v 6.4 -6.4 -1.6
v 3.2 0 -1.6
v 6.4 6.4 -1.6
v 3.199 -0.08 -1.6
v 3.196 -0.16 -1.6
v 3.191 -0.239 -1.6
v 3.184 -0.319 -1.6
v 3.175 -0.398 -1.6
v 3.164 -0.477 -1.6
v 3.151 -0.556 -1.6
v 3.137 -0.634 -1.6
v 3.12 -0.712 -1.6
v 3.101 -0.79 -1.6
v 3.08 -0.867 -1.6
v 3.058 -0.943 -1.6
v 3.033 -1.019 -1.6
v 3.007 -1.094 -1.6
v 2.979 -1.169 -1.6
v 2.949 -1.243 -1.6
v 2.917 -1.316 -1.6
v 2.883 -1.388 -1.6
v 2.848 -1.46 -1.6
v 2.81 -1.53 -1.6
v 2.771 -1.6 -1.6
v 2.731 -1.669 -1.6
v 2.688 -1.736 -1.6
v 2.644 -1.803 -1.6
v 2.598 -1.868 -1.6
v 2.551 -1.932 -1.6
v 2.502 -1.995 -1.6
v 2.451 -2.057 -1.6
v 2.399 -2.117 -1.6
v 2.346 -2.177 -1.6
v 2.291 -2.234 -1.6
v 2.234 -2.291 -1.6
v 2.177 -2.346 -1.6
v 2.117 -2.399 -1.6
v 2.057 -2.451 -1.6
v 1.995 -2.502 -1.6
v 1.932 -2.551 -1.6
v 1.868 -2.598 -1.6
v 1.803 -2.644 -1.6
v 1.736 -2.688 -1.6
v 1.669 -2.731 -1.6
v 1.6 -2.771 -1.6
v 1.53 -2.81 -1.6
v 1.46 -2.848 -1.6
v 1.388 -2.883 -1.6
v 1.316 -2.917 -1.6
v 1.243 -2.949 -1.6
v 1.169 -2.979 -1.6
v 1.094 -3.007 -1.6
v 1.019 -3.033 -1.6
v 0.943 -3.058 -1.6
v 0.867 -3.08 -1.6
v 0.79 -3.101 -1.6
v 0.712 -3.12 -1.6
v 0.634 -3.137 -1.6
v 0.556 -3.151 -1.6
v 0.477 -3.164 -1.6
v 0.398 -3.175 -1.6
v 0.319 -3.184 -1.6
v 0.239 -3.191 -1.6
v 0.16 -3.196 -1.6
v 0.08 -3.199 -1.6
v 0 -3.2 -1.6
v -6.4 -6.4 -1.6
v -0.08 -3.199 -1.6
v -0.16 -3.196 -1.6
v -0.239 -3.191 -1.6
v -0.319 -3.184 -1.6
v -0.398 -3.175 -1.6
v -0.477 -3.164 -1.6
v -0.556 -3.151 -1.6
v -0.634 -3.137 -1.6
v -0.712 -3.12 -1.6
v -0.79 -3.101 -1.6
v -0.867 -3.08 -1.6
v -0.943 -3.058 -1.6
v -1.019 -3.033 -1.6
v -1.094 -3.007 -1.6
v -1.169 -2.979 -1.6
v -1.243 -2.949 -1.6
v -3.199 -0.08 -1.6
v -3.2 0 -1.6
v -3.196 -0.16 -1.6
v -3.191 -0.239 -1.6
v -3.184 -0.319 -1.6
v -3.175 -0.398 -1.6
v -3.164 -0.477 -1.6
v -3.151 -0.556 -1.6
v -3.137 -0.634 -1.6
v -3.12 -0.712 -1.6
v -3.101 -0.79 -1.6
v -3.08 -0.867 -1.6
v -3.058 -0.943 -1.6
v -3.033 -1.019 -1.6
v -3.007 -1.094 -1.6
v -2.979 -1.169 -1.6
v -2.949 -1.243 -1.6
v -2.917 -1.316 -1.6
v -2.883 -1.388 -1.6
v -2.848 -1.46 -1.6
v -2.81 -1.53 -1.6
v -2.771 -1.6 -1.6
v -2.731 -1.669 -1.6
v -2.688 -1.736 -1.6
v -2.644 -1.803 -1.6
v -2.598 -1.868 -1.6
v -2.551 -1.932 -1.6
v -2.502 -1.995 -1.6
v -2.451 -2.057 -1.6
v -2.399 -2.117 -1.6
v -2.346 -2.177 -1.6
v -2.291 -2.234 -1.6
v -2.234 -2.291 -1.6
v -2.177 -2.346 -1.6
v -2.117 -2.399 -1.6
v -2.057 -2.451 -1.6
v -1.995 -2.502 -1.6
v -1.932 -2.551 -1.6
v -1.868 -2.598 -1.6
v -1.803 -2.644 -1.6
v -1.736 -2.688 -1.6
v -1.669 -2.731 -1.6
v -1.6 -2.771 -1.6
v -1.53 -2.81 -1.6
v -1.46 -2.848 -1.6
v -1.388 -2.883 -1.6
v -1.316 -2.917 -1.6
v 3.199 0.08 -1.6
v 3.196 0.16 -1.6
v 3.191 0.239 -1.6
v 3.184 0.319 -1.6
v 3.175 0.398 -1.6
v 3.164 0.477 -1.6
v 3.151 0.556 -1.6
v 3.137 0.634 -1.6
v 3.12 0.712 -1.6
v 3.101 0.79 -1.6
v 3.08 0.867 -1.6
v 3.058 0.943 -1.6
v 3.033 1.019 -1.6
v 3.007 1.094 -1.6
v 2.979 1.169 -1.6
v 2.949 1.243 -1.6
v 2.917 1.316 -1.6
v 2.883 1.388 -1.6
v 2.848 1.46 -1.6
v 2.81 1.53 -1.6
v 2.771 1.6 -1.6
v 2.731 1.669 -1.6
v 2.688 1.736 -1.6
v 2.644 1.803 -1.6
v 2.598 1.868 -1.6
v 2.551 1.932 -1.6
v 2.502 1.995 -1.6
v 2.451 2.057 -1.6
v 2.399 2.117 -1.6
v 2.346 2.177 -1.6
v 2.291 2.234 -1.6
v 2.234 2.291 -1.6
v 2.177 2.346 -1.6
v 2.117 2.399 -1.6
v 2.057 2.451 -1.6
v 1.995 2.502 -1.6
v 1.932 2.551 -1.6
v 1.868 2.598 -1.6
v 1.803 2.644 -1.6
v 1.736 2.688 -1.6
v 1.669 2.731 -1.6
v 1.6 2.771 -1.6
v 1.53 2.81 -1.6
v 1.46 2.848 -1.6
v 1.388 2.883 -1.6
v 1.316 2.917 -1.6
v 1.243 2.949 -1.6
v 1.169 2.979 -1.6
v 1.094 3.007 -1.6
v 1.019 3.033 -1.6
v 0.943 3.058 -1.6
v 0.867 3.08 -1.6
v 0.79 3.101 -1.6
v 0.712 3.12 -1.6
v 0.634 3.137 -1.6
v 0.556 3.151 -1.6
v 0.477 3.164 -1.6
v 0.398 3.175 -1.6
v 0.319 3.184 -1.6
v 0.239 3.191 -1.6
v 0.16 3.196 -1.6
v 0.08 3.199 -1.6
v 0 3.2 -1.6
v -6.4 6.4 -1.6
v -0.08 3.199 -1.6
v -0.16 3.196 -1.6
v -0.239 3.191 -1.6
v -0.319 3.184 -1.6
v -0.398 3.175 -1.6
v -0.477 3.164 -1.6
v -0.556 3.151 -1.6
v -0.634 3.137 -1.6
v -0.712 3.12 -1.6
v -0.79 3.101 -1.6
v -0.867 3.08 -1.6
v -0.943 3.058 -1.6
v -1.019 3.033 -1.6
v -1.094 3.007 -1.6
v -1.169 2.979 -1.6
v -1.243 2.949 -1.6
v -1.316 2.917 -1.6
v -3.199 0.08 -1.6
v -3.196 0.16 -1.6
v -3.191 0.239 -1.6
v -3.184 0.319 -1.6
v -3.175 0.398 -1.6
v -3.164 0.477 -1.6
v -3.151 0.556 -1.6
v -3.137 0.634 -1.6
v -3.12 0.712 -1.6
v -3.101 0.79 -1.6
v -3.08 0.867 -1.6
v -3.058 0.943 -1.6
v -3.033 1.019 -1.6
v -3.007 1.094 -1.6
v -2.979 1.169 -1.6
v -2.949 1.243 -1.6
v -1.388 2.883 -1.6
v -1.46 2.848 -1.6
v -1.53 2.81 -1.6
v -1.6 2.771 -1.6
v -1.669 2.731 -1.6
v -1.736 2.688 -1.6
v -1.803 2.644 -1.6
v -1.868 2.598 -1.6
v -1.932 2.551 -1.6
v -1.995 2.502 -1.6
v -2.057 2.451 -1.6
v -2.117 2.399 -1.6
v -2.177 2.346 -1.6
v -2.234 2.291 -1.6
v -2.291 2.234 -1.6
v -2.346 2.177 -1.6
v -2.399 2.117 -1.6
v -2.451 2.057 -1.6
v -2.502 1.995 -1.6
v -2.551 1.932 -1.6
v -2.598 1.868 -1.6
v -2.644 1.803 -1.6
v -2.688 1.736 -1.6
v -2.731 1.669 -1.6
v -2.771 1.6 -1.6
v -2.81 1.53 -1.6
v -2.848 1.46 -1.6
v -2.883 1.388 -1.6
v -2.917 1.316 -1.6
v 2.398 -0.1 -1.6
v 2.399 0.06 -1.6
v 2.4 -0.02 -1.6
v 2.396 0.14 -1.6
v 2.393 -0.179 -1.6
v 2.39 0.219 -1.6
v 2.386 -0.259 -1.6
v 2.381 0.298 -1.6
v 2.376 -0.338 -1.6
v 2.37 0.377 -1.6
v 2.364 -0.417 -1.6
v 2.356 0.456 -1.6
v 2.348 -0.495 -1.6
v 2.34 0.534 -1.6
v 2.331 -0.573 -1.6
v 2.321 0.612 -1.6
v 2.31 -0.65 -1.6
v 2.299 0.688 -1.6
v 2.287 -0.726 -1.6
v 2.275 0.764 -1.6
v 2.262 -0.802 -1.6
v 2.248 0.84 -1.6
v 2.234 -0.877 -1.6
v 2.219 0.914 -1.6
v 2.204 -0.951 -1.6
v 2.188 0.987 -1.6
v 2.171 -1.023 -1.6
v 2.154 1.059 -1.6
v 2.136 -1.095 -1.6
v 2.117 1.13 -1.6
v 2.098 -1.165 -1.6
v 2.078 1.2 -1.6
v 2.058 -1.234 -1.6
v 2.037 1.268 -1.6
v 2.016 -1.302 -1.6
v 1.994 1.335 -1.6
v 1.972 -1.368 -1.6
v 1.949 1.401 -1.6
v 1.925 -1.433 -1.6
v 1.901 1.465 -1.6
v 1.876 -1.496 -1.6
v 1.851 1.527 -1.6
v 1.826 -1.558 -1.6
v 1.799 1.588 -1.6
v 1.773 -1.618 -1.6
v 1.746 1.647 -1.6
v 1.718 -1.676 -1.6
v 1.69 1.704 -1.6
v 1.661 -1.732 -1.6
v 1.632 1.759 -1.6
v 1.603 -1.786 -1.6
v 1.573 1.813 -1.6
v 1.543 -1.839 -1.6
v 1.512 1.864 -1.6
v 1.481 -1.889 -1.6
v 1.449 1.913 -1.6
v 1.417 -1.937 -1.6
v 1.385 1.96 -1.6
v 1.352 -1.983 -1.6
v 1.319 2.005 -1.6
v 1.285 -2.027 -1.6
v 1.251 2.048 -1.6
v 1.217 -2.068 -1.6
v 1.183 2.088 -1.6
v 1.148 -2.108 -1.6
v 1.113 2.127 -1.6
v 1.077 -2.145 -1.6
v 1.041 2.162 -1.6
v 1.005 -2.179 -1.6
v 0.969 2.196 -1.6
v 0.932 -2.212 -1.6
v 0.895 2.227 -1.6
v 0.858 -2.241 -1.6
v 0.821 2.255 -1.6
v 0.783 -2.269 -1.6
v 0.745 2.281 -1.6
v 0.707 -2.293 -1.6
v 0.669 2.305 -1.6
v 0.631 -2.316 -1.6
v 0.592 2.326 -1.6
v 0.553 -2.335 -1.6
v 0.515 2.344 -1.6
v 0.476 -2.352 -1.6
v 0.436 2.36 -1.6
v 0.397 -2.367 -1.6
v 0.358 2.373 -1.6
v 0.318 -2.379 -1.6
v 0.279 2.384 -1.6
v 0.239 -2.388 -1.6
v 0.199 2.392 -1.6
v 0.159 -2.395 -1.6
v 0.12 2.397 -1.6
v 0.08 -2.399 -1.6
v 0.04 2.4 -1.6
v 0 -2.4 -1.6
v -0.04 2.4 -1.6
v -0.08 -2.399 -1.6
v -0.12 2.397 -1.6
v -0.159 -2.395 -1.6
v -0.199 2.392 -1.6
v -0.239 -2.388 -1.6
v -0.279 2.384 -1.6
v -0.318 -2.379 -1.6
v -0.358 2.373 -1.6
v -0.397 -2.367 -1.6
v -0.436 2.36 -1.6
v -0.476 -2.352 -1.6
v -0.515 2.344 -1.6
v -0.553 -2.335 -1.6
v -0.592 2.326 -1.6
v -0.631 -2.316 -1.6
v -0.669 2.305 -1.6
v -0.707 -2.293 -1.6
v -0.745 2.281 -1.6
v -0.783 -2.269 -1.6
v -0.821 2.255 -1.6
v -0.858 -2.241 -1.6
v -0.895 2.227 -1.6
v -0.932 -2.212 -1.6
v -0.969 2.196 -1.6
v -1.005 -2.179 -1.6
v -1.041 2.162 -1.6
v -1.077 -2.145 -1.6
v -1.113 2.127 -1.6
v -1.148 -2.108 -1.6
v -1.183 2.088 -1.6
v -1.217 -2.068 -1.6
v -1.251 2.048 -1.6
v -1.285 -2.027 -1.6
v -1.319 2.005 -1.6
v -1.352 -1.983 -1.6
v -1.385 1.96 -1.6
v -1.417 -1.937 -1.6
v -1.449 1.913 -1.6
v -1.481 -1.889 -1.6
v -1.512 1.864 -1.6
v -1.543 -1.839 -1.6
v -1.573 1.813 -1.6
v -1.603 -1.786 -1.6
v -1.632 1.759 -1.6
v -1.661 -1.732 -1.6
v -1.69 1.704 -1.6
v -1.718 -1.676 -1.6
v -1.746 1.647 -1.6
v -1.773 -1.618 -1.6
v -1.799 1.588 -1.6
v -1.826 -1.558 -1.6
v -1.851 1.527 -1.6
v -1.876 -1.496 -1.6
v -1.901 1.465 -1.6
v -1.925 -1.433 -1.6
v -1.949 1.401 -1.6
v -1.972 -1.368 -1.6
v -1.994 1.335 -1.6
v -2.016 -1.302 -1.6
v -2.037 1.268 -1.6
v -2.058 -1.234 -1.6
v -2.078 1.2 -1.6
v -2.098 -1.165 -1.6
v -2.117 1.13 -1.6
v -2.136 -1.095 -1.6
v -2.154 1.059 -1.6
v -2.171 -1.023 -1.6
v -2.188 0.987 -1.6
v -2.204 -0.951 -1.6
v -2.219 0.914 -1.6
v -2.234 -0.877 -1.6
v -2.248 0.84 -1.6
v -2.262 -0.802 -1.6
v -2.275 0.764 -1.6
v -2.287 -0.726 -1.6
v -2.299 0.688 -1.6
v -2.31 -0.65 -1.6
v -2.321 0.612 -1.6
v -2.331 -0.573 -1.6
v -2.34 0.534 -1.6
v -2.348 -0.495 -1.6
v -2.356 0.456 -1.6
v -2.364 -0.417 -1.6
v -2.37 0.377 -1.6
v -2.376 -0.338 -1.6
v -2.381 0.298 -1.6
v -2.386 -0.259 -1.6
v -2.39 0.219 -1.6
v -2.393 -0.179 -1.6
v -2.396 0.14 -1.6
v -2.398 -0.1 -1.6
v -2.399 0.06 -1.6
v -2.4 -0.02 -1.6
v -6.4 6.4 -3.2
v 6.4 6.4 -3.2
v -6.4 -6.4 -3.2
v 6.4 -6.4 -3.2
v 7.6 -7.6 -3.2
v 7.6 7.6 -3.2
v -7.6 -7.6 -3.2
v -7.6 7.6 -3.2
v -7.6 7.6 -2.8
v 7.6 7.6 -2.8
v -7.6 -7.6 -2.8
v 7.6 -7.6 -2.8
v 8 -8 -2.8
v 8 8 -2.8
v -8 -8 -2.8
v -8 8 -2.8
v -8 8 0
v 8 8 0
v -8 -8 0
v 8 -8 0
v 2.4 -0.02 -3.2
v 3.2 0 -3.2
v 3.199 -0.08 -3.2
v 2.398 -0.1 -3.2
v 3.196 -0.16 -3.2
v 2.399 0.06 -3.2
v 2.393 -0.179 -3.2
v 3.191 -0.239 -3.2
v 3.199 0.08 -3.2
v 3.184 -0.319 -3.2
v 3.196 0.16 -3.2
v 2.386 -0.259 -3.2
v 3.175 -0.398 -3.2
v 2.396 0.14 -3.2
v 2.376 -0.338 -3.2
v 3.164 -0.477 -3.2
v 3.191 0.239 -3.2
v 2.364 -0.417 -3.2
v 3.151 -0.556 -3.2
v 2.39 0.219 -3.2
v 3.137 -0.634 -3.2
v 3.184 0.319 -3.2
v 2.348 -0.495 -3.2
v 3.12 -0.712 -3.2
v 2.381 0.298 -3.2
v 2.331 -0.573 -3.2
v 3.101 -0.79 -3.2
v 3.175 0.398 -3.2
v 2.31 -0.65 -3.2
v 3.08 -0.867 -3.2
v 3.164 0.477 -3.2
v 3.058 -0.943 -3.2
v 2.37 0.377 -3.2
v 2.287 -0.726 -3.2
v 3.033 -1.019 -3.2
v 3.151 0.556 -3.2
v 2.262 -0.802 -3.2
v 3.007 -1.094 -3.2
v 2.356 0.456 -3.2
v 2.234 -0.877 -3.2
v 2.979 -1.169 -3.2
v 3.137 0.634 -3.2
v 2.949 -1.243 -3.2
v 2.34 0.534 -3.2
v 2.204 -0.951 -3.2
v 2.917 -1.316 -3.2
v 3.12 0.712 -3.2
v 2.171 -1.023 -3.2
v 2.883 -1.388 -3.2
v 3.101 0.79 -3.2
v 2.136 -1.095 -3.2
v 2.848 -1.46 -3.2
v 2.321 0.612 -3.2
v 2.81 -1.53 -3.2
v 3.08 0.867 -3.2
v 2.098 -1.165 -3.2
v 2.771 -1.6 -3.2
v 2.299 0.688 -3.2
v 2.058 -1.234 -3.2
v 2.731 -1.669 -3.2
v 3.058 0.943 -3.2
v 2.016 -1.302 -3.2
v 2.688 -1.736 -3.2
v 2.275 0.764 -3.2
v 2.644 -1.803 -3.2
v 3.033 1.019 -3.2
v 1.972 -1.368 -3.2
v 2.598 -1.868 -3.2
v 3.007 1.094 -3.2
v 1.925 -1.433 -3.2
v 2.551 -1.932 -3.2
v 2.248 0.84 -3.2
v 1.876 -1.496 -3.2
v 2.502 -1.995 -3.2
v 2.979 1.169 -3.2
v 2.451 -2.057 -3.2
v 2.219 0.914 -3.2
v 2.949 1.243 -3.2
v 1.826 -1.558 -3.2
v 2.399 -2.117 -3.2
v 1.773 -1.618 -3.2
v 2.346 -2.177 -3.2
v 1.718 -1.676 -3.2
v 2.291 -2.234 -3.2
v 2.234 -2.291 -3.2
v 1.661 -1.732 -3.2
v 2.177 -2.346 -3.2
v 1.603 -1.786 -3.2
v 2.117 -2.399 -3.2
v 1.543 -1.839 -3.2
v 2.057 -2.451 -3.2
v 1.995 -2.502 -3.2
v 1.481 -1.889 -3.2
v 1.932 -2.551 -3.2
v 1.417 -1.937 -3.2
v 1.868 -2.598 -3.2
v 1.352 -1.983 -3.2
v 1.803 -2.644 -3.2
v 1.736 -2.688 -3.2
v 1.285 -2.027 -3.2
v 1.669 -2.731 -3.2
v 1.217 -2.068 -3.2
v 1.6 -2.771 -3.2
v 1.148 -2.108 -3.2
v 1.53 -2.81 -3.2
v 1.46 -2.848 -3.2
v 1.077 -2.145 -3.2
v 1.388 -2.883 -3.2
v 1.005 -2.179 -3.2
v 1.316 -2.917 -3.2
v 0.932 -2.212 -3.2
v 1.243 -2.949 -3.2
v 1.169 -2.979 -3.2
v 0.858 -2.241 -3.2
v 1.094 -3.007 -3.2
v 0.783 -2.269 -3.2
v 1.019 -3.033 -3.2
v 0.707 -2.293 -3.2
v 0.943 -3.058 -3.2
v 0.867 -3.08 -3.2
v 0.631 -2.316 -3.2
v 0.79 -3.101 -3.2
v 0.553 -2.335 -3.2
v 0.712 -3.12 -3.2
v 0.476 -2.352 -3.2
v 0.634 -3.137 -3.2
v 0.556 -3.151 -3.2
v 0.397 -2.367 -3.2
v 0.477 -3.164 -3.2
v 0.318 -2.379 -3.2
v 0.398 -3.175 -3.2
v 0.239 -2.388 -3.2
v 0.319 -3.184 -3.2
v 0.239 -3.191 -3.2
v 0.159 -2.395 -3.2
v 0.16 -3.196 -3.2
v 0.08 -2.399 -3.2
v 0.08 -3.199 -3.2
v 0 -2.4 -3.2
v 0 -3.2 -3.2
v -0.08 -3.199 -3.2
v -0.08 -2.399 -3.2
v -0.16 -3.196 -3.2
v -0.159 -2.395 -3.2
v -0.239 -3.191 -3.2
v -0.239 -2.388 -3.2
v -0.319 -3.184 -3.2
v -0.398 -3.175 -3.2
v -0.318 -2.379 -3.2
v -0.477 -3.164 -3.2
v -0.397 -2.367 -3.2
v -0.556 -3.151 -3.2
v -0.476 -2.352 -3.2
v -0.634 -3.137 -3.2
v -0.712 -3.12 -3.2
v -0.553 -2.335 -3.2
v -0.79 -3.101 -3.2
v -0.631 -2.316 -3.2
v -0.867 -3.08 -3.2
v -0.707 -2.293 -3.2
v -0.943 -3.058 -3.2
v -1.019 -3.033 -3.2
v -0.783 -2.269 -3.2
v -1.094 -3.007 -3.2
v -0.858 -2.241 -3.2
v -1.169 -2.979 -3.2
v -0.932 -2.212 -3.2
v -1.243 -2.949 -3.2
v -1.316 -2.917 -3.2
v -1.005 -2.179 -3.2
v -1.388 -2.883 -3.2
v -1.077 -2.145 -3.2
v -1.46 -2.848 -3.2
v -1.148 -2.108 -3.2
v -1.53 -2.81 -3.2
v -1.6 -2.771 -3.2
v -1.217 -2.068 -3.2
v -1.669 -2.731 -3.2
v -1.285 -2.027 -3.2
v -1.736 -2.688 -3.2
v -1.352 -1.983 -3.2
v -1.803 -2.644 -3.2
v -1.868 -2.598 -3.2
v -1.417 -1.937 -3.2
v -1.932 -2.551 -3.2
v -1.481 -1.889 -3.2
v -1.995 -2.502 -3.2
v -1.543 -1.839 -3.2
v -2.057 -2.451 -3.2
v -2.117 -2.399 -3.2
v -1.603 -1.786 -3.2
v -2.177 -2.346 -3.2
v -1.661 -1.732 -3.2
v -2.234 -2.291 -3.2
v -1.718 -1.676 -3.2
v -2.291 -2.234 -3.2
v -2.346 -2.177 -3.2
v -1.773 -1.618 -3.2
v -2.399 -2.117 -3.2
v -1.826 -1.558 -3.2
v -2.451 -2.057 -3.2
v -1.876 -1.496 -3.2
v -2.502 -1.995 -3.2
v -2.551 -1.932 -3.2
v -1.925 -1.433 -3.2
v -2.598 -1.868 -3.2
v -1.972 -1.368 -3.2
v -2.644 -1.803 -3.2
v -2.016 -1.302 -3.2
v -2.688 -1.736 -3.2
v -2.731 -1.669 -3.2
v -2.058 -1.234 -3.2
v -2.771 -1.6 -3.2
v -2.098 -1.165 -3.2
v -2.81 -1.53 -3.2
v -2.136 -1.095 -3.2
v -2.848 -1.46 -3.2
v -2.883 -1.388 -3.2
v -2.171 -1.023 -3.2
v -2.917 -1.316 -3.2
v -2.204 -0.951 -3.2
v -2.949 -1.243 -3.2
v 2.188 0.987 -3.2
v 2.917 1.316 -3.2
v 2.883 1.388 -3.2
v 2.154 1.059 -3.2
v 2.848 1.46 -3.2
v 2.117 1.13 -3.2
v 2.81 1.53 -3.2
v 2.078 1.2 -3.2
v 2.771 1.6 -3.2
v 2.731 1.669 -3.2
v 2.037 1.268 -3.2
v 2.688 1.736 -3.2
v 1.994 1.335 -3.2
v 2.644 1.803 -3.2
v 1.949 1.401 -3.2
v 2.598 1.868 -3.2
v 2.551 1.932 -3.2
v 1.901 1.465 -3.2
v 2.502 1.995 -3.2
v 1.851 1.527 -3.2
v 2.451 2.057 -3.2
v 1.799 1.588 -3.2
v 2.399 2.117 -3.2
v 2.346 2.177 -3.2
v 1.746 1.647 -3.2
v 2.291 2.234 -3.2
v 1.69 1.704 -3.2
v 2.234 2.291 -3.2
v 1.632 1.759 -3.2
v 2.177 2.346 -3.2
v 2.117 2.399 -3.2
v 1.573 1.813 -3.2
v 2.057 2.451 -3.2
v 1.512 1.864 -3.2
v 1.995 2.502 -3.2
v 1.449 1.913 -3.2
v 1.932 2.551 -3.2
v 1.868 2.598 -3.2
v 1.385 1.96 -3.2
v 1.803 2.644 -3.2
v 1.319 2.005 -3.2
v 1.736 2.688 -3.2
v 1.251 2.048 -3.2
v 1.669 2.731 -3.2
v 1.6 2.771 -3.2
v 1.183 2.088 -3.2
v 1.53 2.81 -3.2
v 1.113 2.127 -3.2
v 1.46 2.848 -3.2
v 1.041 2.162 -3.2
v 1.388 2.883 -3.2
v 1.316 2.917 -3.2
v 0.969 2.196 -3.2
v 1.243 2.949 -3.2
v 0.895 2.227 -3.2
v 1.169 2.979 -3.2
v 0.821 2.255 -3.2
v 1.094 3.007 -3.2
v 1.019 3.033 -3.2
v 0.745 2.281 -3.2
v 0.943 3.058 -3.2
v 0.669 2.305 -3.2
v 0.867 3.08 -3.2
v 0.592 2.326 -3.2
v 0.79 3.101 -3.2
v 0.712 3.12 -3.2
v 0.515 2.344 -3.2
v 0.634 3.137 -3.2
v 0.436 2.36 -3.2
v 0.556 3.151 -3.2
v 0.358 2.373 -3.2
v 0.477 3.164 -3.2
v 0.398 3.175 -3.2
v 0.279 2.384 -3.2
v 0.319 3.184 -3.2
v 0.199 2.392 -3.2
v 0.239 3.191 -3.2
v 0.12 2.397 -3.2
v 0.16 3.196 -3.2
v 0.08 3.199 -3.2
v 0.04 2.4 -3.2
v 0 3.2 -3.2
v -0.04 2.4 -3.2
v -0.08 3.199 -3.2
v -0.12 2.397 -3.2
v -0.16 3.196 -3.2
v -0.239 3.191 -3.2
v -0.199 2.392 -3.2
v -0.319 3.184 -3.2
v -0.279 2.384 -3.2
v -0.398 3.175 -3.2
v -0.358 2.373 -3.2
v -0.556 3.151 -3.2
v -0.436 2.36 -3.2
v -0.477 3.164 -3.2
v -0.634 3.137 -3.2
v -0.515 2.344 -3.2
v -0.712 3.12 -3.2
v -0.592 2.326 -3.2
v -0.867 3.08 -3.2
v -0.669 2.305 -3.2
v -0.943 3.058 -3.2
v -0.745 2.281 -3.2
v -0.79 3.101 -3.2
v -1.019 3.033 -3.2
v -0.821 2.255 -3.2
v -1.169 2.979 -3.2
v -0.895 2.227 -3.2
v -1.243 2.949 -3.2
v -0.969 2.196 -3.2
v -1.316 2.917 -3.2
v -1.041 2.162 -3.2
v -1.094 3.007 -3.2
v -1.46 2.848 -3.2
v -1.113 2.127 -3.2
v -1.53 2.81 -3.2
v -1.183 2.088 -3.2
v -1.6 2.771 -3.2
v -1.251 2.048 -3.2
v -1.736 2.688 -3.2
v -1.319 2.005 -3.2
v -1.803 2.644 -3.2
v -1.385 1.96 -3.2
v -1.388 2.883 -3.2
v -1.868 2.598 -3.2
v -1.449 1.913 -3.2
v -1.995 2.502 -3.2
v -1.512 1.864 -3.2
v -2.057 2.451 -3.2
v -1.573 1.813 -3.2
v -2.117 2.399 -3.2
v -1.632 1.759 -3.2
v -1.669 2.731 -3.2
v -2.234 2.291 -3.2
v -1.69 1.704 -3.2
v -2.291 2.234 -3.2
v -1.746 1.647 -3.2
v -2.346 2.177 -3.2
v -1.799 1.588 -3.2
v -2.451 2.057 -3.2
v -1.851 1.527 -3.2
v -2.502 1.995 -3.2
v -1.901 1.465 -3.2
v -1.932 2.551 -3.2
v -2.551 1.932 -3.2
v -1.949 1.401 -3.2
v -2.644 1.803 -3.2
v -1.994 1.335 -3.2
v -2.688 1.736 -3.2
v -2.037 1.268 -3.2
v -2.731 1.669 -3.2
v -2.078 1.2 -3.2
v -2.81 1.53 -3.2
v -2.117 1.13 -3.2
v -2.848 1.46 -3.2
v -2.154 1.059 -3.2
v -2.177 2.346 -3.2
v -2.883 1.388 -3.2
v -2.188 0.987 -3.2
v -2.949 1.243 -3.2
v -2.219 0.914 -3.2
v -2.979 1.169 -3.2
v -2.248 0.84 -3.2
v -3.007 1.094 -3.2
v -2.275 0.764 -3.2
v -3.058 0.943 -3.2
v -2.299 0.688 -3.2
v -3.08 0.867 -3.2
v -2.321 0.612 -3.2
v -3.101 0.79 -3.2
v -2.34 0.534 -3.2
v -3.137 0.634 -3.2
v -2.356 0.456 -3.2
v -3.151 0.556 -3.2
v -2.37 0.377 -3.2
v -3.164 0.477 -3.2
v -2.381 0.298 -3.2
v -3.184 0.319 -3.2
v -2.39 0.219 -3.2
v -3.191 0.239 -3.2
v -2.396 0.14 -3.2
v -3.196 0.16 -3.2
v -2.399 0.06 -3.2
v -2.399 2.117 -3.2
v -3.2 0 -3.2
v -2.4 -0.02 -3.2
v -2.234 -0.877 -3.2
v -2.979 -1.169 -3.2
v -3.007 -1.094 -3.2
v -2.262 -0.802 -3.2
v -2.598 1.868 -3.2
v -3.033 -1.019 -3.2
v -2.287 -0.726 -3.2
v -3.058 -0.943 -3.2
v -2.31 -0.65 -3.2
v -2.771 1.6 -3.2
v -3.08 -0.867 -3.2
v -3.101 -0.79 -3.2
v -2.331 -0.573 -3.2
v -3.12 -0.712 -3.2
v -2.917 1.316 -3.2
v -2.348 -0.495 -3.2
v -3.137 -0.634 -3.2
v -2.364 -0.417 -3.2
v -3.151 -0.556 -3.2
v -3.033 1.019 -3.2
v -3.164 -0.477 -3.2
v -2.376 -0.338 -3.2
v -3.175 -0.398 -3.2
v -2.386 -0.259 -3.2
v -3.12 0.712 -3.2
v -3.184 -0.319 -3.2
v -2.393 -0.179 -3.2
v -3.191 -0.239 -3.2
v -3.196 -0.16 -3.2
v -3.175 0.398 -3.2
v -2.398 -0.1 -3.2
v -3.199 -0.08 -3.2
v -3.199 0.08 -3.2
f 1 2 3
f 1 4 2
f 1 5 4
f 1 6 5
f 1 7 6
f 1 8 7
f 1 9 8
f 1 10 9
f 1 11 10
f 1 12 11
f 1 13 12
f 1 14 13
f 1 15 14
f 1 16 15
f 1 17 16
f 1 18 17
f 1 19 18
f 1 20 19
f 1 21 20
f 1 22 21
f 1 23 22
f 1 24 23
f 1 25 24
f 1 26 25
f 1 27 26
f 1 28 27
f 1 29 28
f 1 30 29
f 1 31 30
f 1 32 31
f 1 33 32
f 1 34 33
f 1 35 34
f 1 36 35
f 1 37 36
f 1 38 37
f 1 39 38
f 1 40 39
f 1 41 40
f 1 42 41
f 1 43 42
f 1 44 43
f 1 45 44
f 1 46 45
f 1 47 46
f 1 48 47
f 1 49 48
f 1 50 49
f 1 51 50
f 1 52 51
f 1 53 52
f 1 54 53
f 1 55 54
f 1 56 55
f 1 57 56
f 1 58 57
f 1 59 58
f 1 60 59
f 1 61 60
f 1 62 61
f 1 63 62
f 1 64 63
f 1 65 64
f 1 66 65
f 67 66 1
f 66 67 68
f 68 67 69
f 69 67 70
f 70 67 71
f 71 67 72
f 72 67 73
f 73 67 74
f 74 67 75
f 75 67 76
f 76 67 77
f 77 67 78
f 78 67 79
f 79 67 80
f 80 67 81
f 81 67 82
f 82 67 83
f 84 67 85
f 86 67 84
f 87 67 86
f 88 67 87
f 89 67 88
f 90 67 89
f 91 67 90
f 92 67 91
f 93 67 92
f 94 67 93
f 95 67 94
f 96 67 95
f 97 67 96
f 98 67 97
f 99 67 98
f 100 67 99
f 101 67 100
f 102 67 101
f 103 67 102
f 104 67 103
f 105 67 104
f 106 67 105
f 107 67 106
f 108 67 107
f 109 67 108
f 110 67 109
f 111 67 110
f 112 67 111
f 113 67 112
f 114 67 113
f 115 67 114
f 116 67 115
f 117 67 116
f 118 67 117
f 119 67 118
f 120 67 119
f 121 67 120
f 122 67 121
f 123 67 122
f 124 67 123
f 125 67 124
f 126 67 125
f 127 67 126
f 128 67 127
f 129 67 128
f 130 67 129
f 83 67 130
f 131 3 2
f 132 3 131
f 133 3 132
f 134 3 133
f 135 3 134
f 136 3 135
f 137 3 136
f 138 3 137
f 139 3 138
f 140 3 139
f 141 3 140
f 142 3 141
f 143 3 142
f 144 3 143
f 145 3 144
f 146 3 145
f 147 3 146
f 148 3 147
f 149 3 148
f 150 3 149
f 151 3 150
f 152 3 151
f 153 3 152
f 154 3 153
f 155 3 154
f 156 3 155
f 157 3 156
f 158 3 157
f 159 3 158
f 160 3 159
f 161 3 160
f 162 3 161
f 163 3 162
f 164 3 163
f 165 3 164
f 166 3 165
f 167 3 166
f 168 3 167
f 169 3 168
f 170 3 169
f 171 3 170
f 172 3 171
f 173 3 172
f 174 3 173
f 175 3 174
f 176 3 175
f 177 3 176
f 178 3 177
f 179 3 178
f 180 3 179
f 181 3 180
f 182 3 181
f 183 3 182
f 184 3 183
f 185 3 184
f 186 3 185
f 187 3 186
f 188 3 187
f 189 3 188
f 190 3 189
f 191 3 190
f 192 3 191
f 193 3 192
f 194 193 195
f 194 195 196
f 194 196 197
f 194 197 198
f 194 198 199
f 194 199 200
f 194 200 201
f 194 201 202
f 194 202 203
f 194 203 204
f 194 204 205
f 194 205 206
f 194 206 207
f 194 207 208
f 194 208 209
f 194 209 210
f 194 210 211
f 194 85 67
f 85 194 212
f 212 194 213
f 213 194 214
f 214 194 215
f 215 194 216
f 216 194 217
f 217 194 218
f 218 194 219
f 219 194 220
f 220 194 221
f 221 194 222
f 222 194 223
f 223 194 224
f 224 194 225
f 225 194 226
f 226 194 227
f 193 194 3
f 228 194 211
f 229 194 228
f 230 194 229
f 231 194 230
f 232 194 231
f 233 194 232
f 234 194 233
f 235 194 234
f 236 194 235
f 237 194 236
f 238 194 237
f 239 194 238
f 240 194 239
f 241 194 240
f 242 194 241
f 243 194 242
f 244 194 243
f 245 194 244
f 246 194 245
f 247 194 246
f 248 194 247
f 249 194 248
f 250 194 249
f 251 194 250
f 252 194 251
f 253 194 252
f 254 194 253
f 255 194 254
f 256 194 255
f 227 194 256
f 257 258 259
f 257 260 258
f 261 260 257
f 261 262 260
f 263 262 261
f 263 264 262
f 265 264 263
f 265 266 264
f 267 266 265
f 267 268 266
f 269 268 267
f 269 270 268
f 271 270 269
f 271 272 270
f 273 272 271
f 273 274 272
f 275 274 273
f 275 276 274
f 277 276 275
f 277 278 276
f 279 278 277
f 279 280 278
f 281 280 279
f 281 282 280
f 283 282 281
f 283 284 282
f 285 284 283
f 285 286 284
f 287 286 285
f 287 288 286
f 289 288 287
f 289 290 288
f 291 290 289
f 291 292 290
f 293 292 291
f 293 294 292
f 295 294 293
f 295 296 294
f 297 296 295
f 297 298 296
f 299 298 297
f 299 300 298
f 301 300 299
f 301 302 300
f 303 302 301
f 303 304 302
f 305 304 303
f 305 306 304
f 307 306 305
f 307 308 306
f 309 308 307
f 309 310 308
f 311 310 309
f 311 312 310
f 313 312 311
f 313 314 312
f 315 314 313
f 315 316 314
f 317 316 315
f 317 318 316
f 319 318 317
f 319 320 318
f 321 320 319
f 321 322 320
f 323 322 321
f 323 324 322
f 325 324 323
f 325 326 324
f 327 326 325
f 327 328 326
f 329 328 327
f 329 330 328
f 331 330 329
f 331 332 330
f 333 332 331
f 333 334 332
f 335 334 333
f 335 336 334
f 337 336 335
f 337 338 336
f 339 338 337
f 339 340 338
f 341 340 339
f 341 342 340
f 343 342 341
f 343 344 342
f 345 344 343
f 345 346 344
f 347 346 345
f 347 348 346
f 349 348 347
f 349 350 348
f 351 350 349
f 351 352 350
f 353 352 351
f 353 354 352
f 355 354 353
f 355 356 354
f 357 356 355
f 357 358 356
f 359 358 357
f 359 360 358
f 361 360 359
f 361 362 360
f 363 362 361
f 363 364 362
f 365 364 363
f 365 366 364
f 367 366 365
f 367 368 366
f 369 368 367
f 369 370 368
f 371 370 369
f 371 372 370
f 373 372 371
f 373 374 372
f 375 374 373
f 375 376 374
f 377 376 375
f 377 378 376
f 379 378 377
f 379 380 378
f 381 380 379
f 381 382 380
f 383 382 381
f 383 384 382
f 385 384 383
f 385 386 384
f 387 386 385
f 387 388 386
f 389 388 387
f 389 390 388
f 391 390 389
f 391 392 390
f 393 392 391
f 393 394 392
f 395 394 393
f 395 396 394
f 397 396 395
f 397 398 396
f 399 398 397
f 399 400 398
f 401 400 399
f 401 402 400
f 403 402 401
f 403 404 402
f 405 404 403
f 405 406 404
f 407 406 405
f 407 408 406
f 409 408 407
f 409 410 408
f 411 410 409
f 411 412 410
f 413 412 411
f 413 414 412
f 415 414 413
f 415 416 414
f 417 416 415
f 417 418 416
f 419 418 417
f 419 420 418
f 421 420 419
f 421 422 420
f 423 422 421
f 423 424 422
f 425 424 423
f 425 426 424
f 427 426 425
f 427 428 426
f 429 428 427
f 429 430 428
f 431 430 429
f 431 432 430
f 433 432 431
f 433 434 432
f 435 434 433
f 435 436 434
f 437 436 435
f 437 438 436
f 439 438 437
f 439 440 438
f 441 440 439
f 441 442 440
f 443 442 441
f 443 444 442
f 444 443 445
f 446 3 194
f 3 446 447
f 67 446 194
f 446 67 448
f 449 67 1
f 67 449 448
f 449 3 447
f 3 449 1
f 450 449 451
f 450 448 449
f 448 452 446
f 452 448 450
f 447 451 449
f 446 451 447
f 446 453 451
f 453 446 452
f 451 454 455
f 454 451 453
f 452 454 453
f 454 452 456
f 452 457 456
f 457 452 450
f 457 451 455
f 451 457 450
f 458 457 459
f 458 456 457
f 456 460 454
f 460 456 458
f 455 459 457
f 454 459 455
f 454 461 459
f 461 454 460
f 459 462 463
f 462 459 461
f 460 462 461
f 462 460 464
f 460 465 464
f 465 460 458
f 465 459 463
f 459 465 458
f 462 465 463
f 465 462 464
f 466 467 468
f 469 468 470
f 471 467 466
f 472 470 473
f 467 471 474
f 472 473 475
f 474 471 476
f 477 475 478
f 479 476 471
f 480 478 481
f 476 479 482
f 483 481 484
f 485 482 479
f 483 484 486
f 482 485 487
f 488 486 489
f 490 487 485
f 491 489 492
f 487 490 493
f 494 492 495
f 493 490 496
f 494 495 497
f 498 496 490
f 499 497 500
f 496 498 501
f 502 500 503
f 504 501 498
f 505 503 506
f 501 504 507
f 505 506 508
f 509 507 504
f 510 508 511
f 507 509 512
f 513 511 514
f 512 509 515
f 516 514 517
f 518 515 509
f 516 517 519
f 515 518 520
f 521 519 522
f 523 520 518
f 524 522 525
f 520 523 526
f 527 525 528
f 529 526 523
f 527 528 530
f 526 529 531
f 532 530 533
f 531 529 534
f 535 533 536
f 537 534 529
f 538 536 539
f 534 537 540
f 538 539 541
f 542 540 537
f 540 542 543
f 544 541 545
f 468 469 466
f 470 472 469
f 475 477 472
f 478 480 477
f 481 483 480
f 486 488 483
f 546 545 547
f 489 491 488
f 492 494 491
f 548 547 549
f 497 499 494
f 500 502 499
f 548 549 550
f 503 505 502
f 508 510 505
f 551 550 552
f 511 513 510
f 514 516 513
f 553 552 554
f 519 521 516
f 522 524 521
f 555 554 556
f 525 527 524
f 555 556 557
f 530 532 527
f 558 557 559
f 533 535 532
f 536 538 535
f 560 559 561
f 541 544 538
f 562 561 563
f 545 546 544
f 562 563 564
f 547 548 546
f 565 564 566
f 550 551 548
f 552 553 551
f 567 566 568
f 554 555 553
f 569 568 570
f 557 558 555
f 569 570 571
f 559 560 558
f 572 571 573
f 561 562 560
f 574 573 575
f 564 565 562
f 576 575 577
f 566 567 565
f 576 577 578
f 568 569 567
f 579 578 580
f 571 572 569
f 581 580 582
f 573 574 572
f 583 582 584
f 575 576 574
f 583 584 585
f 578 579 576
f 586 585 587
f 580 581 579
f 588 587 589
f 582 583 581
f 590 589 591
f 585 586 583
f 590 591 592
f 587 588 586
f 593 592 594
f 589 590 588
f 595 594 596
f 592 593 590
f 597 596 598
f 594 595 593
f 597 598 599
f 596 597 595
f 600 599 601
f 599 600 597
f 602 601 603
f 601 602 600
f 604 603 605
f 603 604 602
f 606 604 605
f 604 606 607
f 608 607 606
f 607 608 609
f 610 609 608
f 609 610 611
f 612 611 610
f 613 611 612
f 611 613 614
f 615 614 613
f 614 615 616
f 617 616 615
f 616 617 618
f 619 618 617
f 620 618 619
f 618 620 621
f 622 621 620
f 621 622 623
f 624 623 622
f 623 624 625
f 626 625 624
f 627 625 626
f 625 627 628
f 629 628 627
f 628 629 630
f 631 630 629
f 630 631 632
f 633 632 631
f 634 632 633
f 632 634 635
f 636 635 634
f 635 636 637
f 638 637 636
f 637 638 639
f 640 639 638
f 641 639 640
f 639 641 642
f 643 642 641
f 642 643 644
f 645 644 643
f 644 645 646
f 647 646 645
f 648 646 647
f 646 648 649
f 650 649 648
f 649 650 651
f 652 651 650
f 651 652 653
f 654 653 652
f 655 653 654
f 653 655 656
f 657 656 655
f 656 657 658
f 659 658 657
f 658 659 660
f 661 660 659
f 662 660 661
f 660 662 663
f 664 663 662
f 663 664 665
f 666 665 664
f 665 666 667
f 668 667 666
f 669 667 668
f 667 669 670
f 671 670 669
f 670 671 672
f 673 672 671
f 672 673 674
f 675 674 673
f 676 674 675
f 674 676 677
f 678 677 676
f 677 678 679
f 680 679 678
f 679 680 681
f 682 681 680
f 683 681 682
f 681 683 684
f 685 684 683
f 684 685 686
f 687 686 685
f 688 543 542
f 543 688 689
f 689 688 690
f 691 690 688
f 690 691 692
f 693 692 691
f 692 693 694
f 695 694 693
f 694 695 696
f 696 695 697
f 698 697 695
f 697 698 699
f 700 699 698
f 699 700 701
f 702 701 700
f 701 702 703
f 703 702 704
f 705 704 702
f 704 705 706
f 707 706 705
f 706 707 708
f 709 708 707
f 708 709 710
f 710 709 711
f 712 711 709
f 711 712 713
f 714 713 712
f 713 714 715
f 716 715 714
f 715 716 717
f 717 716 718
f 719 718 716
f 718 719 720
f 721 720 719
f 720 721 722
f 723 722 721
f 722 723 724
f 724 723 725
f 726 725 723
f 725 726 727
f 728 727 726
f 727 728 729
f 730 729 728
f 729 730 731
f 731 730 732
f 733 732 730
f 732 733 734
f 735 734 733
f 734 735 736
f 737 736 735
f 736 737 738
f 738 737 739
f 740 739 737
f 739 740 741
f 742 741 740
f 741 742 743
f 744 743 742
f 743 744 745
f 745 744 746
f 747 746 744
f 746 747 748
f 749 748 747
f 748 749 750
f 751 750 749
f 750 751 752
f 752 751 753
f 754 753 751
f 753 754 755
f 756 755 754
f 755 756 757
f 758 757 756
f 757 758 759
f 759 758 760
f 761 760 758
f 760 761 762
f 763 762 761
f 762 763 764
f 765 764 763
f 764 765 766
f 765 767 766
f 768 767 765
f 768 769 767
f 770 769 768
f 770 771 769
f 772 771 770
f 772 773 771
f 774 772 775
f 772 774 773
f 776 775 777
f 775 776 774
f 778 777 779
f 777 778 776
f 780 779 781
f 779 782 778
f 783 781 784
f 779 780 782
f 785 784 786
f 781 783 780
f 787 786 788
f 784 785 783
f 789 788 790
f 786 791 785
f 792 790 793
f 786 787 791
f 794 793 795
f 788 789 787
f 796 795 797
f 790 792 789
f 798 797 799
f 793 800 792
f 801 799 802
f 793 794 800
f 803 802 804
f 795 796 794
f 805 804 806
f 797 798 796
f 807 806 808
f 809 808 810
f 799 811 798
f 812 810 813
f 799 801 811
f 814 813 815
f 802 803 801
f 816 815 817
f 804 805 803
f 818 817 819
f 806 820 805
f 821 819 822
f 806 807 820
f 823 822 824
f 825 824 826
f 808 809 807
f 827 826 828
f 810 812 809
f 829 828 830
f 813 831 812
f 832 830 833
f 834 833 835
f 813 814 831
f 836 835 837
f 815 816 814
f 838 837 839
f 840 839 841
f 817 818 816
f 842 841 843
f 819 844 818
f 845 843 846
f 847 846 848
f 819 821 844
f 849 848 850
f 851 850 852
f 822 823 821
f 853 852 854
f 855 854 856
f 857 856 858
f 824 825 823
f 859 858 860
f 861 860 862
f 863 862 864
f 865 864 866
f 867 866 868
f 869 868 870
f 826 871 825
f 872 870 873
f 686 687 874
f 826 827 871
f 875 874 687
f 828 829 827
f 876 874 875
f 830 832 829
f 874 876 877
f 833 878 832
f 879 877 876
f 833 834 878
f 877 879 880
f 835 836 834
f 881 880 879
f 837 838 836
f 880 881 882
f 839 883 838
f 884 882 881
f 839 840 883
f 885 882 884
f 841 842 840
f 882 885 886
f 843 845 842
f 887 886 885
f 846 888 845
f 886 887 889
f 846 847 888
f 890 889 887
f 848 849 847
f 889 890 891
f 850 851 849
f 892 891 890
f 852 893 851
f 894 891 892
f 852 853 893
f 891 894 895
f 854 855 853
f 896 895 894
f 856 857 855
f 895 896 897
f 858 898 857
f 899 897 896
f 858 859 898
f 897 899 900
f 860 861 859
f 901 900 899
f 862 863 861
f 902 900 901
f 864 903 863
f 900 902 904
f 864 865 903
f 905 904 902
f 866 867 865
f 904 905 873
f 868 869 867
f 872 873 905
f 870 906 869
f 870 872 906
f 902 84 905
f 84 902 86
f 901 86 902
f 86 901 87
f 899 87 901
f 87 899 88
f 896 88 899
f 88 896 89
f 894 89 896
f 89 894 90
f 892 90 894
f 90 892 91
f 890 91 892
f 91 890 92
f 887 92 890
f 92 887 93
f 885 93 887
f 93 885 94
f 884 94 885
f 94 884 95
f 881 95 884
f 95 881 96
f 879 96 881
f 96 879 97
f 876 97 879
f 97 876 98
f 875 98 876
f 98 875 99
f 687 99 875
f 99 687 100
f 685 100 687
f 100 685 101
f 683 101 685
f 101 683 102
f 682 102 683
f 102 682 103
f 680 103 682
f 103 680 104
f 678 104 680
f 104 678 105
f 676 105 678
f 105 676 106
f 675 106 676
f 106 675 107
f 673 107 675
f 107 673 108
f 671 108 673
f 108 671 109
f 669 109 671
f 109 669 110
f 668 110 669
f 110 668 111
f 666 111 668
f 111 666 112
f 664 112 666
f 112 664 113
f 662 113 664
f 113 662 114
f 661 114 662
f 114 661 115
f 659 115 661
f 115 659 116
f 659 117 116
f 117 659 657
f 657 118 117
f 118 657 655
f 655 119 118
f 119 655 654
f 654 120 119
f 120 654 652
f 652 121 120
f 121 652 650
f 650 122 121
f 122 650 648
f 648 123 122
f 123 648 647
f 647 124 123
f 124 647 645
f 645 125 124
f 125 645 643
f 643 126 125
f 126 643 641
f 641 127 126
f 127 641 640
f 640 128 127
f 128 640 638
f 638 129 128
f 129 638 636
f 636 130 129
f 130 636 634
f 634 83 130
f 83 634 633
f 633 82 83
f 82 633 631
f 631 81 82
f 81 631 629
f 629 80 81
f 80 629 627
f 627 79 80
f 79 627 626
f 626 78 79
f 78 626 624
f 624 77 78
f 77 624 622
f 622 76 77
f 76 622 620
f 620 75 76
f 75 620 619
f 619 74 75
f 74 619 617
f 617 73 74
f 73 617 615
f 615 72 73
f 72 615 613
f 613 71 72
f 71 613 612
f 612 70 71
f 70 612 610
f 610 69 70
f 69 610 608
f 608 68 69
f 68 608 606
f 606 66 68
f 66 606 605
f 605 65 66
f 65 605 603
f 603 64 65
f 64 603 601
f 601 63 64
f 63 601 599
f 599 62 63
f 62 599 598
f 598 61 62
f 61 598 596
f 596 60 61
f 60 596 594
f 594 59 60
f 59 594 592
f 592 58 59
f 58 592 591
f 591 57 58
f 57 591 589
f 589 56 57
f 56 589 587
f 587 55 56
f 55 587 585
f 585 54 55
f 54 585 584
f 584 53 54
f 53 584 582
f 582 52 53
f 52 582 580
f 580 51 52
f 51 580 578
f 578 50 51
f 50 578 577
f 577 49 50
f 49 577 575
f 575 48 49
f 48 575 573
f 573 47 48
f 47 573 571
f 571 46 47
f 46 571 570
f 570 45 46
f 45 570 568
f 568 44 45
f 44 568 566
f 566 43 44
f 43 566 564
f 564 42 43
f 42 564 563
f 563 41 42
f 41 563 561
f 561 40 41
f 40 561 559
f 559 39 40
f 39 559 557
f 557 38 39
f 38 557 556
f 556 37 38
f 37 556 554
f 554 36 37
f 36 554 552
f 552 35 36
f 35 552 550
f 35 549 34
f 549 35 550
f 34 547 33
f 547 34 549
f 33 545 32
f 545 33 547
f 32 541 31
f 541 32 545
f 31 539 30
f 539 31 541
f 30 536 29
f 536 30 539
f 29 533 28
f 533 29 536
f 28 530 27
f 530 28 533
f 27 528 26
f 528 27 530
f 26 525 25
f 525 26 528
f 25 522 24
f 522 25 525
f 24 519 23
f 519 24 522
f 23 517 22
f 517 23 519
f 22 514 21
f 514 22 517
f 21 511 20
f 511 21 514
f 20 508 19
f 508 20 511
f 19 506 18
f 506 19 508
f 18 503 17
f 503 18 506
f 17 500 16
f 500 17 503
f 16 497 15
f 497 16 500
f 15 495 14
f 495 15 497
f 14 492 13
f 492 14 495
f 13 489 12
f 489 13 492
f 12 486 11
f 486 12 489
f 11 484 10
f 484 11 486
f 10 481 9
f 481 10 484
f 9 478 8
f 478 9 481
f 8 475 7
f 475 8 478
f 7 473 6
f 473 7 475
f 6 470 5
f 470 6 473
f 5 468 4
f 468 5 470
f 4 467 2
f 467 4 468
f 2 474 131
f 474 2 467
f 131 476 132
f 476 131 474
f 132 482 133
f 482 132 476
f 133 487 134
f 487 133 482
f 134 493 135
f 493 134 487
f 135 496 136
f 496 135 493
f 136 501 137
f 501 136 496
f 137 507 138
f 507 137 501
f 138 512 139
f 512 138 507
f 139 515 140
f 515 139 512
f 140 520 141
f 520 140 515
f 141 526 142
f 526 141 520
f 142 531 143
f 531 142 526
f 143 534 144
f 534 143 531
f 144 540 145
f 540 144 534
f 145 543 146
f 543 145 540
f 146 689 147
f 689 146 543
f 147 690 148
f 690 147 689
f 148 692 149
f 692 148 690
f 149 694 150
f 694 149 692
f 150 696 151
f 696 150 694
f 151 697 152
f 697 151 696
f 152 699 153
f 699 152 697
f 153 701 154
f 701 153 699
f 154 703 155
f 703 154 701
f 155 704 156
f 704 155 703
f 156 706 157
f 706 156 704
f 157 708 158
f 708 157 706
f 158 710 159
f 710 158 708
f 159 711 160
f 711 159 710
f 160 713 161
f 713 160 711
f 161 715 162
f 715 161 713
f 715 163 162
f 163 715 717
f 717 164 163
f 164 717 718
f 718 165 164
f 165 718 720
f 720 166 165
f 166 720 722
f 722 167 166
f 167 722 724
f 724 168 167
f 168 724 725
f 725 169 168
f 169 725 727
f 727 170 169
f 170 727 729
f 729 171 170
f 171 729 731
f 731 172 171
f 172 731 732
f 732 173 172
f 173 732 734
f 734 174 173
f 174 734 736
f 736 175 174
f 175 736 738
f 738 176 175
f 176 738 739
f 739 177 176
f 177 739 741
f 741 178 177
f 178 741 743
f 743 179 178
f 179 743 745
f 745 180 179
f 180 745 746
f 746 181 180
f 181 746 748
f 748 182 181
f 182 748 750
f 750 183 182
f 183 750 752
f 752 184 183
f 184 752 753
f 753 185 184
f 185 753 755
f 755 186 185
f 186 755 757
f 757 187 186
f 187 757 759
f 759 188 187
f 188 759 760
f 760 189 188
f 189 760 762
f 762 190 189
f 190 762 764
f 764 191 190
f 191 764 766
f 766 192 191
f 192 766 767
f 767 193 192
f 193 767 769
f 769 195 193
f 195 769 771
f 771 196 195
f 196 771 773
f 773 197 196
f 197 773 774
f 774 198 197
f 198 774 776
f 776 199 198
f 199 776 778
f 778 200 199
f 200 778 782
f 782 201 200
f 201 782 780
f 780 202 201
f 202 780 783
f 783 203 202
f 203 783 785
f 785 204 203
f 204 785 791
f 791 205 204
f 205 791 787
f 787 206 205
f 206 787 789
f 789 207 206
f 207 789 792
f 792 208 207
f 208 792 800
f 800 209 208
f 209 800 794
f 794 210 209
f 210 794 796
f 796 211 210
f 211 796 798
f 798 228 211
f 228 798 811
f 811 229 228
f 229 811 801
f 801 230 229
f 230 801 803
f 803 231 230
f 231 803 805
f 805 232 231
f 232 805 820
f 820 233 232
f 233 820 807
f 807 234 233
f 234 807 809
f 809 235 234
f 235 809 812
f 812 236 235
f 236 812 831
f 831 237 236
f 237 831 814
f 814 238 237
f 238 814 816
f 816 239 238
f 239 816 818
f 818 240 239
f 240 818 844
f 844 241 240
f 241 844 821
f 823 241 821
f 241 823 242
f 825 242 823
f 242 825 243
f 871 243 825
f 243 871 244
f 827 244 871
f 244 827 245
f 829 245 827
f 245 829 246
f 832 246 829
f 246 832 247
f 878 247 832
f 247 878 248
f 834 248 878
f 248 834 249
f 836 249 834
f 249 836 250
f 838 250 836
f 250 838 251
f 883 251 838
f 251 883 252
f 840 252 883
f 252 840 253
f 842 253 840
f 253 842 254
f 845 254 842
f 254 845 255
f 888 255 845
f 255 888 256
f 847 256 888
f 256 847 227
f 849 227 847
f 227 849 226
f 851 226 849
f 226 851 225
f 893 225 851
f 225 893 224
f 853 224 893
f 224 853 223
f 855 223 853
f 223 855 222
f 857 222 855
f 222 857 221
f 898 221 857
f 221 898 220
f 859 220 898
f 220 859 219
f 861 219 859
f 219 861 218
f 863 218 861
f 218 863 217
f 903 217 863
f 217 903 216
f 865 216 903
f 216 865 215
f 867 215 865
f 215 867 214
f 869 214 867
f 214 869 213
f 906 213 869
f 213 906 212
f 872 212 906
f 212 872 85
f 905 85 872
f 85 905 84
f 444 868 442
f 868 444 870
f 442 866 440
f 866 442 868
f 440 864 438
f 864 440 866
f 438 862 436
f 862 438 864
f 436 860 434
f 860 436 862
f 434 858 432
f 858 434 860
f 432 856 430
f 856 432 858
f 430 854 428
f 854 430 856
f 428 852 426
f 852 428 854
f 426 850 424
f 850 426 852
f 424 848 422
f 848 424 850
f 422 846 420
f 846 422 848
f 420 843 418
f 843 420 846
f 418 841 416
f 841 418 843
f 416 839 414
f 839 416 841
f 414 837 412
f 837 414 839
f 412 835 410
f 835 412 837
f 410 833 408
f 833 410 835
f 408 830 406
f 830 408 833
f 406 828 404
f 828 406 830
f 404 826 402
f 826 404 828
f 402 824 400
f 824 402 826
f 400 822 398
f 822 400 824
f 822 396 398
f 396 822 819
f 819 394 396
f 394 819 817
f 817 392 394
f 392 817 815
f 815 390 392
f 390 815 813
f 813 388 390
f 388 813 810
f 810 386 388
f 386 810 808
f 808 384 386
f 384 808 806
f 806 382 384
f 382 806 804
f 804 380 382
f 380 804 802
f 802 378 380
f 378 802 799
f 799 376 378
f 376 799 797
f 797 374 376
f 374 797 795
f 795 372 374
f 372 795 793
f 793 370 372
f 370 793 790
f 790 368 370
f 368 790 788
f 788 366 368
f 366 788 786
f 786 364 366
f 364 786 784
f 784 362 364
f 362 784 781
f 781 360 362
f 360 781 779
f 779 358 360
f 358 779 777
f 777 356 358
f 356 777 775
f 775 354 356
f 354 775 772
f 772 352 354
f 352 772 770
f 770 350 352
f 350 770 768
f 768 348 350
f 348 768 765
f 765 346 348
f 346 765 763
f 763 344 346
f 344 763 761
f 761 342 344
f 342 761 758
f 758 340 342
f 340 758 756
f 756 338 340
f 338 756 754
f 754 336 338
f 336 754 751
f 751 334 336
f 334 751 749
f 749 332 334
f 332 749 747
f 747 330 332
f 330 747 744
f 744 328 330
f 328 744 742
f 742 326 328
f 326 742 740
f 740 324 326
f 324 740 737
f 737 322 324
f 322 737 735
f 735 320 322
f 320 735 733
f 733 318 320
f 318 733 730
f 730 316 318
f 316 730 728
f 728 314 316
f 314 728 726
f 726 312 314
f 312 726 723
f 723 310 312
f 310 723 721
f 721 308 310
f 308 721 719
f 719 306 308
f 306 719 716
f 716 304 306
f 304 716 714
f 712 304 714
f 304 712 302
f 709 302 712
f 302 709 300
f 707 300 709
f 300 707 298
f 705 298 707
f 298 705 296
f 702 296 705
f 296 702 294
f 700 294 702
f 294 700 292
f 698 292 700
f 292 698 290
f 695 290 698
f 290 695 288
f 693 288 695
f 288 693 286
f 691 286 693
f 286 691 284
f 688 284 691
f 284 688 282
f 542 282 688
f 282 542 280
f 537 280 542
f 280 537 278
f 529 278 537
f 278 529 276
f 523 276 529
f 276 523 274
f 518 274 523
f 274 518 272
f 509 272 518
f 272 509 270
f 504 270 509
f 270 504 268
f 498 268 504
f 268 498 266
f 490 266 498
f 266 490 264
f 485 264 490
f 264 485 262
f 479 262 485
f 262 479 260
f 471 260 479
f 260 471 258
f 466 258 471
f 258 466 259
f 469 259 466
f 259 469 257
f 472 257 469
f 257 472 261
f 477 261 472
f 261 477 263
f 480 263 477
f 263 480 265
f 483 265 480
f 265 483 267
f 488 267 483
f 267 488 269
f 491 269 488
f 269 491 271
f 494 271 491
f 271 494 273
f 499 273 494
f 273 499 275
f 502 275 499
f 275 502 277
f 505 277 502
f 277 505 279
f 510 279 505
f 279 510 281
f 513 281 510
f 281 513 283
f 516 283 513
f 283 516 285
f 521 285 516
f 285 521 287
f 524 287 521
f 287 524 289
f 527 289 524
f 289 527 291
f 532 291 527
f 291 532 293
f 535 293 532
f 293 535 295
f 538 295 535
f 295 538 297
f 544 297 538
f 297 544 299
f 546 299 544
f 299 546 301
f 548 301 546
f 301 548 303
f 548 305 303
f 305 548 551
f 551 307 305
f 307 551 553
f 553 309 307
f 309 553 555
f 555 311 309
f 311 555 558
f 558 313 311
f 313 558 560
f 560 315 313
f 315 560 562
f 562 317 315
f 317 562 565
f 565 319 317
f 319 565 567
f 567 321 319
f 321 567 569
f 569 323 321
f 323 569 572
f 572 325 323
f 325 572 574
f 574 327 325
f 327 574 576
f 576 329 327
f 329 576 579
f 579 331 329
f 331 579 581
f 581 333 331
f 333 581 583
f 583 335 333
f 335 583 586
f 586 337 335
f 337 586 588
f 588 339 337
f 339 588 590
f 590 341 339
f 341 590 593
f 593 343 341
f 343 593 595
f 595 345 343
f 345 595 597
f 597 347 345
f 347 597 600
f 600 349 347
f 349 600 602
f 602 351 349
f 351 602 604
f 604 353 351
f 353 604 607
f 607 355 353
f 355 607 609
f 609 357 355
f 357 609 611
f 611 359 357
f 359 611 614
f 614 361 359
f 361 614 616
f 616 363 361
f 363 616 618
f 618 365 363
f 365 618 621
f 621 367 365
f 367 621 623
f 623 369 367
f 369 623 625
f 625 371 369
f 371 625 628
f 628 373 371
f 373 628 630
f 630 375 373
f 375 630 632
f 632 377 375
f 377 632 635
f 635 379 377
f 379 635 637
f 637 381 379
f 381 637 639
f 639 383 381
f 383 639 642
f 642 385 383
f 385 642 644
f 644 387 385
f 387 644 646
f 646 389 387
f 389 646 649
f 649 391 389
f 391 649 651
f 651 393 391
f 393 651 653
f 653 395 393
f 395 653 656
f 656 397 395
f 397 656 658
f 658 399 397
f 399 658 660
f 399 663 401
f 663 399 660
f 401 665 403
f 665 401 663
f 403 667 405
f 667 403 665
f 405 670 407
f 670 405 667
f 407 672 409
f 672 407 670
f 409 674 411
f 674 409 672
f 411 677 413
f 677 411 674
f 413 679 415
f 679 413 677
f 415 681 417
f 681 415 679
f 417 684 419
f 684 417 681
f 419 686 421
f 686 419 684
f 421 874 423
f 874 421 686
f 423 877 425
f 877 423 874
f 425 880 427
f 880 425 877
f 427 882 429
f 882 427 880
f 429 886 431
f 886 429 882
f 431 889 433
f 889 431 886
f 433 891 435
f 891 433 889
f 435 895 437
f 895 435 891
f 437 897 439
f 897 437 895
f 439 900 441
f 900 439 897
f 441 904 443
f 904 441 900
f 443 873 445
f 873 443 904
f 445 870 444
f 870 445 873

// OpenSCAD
use <../lib.scad>
use <../p/4-4disc.scad>
use <../p/4-4ndis.scad>
use <s/3068bs01.scad>
$fa=1; $fs=0.2;
function ldraw_lib__3068bp93(realsolid=false) = [
// 0 Tile  2 x  2 with  3 Black Dots Pattern
// 0 Name: 3068bp93.dat
// 0 Author: Philippe Hurbain [Philo]
// 0 !LDRAW_ORG Part UPDATE 2011-01
// 0 !LICENSE Licensed under CC BY 2.0 and CC BY 4.0 : see CAreadme.txt
// 
// 0 BFC CERTIFY CCW
  [0,"BFC","CERTIFY"],
  [0,"BFC","CCW"],
// 
// 0 !KEYWORDS dice, die
// 
// 0 !HISTORY 2011-07-25 [PTadmin] Official Update 2011-01
// 
// 
// 1 16 0 0 0 1 0 0 0 1 0 0 0 1 s\3068bs01.dat
  [1,16,0,0,0,1,0,0,0,1,0,0,0,1, ldraw_lib__s__3068bs01(realsolid)],
// 1 0 0 0 0 4.5 0 0 0 4.5 0 0 0 4.5 4-4disc.dat
  [1,0,0,0,0,4.5,0,0,0,4.5,0,0,0,4.5, ldraw_lib__4_4disc(realsolid)],
// 1 0 9.5 0 9.5 4.5 0 0 0 4.5 0 0 0 4.5 4-4disc.dat
  [1,0,9.5,0,9.5,4.5,0,0,0,4.5,0,0,0,4.5, ldraw_lib__4_4disc(realsolid)],
// 1 0 -9.5 0 -9.5 4.5 0 0 0 4.5 0 0 0 4.5 4-4disc.dat
  [1,0,-9.5,0,-9.5,4.5,0,0,0,4.5,0,0,0,4.5, ldraw_lib__4_4disc(realsolid)],
// 1 16 9.5 0 9.5 4.5 0 0 0 4.5 0 0 0 4.5 4-4ndis.dat
  [1,16,9.5,0,9.5,4.5,0,0,0,4.5,0,0,0,4.5, ldraw_lib__4_4ndis(realsolid)],
// 1 16 0 0 0 4.5 0 0 0 4.5 0 0 0 4.5 4-4ndis.dat
  [1,16,0,0,0,4.5,0,0,0,4.5,0,0,0,4.5, ldraw_lib__4_4ndis(realsolid)],
// 1 16 -9.5 0 -9.5 4.5 0 0 0 4.5 0 0 0 4.5 4-4ndis.dat
  [1,16,-9.5,0,-9.5,4.5,0,0,0,4.5,0,0,0,4.5, ldraw_lib__4_4ndis(realsolid)],
// 4 16 -4.5 0 0 -9.5 0 -5 -5 0 -5 -4.5 0 -4.5
  [4,16,-4.5,0,0,-9.5,0,-5,-5,0,-5,-4.5,0,-4.5],
// 4 16 -4.5 0 -4.5 -5 0 -5 -5 0 -9.5 0 0 -4.5
  [4,16,-4.5,0,-4.5,-5,0,-5,-5,0,-9.5,0,0,-4.5],
// 4 16 5 0 5 4.5 0 4.5 4.5 0 0 9.5 0 5
  [4,16,5,0,5,4.5,0,4.5,4.5,0,0,9.5,0,5],
// 4 16 0 0 4.5 4.5 0 4.5 5 0 5 5 0 9.5
  [4,16,0,0,4.5,4.5,0,4.5,5,0,5,5,0,9.5],
// 3 16 -9.5 0 -14 -14 0 -14 -20 0 -20
  [3,16,-9.5,0,-14,-14,0,-14,-20,0,-20],
// 3 16 -20 0 -20 -5 0 -14 -9.5 0 -14
  [3,16,-20,0,-20,-5,0,-14,-9.5,0,-14],
// 3 16 -14 0 -14 -14 0 -9.5 -20 0 -20
  [3,16,-14,0,-14,-14,0,-9.5,-20,0,-20],
// 3 16 -20 0 -20 -14 0 -9.5 -14 0 -5
  [3,16,-20,0,-20,-14,0,-9.5,-14,0,-5],
// 3 16 14 0 5 20 0 20 14 0 9.5
  [3,16,14,0,5,20,0,20,14,0,9.5],
// 3 16 20 0 20 14 0 14 14 0 9.5
  [3,16,20,0,20,14,0,14,14,0,9.5],
// 3 16 9.5 0 14 14 0 14 20 0 20
  [3,16,9.5,0,14,14,0,14,20,0,20],
// 3 16 20 0 20 5 0 14 9.5 0 14
  [3,16,20,0,20,5,0,14,9.5,0,14],
// 4 16 0 0 4.5 5 0 9.5 5 0 14 -4.5 0 4.5
  [4,16,0,0,4.5,5,0,9.5,5,0,14,-4.5,0,4.5],
// 4 16 -9.5 0 -5 -4.5 0 0 -4.5 0 4.5 -14 0 -5
  [4,16,-9.5,0,-5,-4.5,0,0,-4.5,0,4.5,-14,0,-5],
// 4 16 -5 0 -14 4.5 0 -4.5 0 0 -4.5 -5 0 -9.5
  [4,16,-5,0,-14,4.5,0,-4.5,0,0,-4.5,-5,0,-9.5],
// 4 16 4.5 0 -4.5 14 0 5 9.5 0 5 4.5 0 0
  [4,16,4.5,0,-4.5,14,0,5,9.5,0,5,4.5,0,0],
// 3 16 14 0 5 20 0 -20 20 0 20
  [3,16,14,0,5,20,0,-20,20,0,20],
// 3 16 14 0 5 4.5 0 -4.5 20 0 -20
  [3,16,14,0,5,4.5,0,-4.5,20,0,-20],
// 3 16 4.5 0 -4.5 -5 0 -14 20 0 -20
  [3,16,4.5,0,-4.5,-5,0,-14,20,0,-20],
// 3 16 20 0 -20 -5 0 -14 -20 0 -20
  [3,16,20,0,-20,-5,0,-14,-20,0,-20],
// 3 16 5 0 14 20 0 20 -20 0 20
  [3,16,5,0,14,20,0,20,-20,0,20],
// 3 16 -20 0 20 -4.5 0 4.5 5 0 14
  [3,16,-20,0,20,-4.5,0,4.5,5,0,14],
// 3 16 -14 0 -5 -4.5 0 4.5 -20 0 20
  [3,16,-14,0,-5,-4.5,0,4.5,-20,0,20],
// 3 16 -14 0 -5 -20 0 20 -20 0 -20
  [3,16,-14,0,-5,-20,0,20,-20,0,-20],
];
module ldraw_lib__3068bp93(step=0, col=false, unit=2/5, alt=false, line=0.2, solid=!$preview)
    makepoly(ldraw_lib__3068bp93(solid), step=step, col=col, unit=unit, alt=alt, line=line, solid=solid);
ldraw_lib__3068bp93(line=0.2);
